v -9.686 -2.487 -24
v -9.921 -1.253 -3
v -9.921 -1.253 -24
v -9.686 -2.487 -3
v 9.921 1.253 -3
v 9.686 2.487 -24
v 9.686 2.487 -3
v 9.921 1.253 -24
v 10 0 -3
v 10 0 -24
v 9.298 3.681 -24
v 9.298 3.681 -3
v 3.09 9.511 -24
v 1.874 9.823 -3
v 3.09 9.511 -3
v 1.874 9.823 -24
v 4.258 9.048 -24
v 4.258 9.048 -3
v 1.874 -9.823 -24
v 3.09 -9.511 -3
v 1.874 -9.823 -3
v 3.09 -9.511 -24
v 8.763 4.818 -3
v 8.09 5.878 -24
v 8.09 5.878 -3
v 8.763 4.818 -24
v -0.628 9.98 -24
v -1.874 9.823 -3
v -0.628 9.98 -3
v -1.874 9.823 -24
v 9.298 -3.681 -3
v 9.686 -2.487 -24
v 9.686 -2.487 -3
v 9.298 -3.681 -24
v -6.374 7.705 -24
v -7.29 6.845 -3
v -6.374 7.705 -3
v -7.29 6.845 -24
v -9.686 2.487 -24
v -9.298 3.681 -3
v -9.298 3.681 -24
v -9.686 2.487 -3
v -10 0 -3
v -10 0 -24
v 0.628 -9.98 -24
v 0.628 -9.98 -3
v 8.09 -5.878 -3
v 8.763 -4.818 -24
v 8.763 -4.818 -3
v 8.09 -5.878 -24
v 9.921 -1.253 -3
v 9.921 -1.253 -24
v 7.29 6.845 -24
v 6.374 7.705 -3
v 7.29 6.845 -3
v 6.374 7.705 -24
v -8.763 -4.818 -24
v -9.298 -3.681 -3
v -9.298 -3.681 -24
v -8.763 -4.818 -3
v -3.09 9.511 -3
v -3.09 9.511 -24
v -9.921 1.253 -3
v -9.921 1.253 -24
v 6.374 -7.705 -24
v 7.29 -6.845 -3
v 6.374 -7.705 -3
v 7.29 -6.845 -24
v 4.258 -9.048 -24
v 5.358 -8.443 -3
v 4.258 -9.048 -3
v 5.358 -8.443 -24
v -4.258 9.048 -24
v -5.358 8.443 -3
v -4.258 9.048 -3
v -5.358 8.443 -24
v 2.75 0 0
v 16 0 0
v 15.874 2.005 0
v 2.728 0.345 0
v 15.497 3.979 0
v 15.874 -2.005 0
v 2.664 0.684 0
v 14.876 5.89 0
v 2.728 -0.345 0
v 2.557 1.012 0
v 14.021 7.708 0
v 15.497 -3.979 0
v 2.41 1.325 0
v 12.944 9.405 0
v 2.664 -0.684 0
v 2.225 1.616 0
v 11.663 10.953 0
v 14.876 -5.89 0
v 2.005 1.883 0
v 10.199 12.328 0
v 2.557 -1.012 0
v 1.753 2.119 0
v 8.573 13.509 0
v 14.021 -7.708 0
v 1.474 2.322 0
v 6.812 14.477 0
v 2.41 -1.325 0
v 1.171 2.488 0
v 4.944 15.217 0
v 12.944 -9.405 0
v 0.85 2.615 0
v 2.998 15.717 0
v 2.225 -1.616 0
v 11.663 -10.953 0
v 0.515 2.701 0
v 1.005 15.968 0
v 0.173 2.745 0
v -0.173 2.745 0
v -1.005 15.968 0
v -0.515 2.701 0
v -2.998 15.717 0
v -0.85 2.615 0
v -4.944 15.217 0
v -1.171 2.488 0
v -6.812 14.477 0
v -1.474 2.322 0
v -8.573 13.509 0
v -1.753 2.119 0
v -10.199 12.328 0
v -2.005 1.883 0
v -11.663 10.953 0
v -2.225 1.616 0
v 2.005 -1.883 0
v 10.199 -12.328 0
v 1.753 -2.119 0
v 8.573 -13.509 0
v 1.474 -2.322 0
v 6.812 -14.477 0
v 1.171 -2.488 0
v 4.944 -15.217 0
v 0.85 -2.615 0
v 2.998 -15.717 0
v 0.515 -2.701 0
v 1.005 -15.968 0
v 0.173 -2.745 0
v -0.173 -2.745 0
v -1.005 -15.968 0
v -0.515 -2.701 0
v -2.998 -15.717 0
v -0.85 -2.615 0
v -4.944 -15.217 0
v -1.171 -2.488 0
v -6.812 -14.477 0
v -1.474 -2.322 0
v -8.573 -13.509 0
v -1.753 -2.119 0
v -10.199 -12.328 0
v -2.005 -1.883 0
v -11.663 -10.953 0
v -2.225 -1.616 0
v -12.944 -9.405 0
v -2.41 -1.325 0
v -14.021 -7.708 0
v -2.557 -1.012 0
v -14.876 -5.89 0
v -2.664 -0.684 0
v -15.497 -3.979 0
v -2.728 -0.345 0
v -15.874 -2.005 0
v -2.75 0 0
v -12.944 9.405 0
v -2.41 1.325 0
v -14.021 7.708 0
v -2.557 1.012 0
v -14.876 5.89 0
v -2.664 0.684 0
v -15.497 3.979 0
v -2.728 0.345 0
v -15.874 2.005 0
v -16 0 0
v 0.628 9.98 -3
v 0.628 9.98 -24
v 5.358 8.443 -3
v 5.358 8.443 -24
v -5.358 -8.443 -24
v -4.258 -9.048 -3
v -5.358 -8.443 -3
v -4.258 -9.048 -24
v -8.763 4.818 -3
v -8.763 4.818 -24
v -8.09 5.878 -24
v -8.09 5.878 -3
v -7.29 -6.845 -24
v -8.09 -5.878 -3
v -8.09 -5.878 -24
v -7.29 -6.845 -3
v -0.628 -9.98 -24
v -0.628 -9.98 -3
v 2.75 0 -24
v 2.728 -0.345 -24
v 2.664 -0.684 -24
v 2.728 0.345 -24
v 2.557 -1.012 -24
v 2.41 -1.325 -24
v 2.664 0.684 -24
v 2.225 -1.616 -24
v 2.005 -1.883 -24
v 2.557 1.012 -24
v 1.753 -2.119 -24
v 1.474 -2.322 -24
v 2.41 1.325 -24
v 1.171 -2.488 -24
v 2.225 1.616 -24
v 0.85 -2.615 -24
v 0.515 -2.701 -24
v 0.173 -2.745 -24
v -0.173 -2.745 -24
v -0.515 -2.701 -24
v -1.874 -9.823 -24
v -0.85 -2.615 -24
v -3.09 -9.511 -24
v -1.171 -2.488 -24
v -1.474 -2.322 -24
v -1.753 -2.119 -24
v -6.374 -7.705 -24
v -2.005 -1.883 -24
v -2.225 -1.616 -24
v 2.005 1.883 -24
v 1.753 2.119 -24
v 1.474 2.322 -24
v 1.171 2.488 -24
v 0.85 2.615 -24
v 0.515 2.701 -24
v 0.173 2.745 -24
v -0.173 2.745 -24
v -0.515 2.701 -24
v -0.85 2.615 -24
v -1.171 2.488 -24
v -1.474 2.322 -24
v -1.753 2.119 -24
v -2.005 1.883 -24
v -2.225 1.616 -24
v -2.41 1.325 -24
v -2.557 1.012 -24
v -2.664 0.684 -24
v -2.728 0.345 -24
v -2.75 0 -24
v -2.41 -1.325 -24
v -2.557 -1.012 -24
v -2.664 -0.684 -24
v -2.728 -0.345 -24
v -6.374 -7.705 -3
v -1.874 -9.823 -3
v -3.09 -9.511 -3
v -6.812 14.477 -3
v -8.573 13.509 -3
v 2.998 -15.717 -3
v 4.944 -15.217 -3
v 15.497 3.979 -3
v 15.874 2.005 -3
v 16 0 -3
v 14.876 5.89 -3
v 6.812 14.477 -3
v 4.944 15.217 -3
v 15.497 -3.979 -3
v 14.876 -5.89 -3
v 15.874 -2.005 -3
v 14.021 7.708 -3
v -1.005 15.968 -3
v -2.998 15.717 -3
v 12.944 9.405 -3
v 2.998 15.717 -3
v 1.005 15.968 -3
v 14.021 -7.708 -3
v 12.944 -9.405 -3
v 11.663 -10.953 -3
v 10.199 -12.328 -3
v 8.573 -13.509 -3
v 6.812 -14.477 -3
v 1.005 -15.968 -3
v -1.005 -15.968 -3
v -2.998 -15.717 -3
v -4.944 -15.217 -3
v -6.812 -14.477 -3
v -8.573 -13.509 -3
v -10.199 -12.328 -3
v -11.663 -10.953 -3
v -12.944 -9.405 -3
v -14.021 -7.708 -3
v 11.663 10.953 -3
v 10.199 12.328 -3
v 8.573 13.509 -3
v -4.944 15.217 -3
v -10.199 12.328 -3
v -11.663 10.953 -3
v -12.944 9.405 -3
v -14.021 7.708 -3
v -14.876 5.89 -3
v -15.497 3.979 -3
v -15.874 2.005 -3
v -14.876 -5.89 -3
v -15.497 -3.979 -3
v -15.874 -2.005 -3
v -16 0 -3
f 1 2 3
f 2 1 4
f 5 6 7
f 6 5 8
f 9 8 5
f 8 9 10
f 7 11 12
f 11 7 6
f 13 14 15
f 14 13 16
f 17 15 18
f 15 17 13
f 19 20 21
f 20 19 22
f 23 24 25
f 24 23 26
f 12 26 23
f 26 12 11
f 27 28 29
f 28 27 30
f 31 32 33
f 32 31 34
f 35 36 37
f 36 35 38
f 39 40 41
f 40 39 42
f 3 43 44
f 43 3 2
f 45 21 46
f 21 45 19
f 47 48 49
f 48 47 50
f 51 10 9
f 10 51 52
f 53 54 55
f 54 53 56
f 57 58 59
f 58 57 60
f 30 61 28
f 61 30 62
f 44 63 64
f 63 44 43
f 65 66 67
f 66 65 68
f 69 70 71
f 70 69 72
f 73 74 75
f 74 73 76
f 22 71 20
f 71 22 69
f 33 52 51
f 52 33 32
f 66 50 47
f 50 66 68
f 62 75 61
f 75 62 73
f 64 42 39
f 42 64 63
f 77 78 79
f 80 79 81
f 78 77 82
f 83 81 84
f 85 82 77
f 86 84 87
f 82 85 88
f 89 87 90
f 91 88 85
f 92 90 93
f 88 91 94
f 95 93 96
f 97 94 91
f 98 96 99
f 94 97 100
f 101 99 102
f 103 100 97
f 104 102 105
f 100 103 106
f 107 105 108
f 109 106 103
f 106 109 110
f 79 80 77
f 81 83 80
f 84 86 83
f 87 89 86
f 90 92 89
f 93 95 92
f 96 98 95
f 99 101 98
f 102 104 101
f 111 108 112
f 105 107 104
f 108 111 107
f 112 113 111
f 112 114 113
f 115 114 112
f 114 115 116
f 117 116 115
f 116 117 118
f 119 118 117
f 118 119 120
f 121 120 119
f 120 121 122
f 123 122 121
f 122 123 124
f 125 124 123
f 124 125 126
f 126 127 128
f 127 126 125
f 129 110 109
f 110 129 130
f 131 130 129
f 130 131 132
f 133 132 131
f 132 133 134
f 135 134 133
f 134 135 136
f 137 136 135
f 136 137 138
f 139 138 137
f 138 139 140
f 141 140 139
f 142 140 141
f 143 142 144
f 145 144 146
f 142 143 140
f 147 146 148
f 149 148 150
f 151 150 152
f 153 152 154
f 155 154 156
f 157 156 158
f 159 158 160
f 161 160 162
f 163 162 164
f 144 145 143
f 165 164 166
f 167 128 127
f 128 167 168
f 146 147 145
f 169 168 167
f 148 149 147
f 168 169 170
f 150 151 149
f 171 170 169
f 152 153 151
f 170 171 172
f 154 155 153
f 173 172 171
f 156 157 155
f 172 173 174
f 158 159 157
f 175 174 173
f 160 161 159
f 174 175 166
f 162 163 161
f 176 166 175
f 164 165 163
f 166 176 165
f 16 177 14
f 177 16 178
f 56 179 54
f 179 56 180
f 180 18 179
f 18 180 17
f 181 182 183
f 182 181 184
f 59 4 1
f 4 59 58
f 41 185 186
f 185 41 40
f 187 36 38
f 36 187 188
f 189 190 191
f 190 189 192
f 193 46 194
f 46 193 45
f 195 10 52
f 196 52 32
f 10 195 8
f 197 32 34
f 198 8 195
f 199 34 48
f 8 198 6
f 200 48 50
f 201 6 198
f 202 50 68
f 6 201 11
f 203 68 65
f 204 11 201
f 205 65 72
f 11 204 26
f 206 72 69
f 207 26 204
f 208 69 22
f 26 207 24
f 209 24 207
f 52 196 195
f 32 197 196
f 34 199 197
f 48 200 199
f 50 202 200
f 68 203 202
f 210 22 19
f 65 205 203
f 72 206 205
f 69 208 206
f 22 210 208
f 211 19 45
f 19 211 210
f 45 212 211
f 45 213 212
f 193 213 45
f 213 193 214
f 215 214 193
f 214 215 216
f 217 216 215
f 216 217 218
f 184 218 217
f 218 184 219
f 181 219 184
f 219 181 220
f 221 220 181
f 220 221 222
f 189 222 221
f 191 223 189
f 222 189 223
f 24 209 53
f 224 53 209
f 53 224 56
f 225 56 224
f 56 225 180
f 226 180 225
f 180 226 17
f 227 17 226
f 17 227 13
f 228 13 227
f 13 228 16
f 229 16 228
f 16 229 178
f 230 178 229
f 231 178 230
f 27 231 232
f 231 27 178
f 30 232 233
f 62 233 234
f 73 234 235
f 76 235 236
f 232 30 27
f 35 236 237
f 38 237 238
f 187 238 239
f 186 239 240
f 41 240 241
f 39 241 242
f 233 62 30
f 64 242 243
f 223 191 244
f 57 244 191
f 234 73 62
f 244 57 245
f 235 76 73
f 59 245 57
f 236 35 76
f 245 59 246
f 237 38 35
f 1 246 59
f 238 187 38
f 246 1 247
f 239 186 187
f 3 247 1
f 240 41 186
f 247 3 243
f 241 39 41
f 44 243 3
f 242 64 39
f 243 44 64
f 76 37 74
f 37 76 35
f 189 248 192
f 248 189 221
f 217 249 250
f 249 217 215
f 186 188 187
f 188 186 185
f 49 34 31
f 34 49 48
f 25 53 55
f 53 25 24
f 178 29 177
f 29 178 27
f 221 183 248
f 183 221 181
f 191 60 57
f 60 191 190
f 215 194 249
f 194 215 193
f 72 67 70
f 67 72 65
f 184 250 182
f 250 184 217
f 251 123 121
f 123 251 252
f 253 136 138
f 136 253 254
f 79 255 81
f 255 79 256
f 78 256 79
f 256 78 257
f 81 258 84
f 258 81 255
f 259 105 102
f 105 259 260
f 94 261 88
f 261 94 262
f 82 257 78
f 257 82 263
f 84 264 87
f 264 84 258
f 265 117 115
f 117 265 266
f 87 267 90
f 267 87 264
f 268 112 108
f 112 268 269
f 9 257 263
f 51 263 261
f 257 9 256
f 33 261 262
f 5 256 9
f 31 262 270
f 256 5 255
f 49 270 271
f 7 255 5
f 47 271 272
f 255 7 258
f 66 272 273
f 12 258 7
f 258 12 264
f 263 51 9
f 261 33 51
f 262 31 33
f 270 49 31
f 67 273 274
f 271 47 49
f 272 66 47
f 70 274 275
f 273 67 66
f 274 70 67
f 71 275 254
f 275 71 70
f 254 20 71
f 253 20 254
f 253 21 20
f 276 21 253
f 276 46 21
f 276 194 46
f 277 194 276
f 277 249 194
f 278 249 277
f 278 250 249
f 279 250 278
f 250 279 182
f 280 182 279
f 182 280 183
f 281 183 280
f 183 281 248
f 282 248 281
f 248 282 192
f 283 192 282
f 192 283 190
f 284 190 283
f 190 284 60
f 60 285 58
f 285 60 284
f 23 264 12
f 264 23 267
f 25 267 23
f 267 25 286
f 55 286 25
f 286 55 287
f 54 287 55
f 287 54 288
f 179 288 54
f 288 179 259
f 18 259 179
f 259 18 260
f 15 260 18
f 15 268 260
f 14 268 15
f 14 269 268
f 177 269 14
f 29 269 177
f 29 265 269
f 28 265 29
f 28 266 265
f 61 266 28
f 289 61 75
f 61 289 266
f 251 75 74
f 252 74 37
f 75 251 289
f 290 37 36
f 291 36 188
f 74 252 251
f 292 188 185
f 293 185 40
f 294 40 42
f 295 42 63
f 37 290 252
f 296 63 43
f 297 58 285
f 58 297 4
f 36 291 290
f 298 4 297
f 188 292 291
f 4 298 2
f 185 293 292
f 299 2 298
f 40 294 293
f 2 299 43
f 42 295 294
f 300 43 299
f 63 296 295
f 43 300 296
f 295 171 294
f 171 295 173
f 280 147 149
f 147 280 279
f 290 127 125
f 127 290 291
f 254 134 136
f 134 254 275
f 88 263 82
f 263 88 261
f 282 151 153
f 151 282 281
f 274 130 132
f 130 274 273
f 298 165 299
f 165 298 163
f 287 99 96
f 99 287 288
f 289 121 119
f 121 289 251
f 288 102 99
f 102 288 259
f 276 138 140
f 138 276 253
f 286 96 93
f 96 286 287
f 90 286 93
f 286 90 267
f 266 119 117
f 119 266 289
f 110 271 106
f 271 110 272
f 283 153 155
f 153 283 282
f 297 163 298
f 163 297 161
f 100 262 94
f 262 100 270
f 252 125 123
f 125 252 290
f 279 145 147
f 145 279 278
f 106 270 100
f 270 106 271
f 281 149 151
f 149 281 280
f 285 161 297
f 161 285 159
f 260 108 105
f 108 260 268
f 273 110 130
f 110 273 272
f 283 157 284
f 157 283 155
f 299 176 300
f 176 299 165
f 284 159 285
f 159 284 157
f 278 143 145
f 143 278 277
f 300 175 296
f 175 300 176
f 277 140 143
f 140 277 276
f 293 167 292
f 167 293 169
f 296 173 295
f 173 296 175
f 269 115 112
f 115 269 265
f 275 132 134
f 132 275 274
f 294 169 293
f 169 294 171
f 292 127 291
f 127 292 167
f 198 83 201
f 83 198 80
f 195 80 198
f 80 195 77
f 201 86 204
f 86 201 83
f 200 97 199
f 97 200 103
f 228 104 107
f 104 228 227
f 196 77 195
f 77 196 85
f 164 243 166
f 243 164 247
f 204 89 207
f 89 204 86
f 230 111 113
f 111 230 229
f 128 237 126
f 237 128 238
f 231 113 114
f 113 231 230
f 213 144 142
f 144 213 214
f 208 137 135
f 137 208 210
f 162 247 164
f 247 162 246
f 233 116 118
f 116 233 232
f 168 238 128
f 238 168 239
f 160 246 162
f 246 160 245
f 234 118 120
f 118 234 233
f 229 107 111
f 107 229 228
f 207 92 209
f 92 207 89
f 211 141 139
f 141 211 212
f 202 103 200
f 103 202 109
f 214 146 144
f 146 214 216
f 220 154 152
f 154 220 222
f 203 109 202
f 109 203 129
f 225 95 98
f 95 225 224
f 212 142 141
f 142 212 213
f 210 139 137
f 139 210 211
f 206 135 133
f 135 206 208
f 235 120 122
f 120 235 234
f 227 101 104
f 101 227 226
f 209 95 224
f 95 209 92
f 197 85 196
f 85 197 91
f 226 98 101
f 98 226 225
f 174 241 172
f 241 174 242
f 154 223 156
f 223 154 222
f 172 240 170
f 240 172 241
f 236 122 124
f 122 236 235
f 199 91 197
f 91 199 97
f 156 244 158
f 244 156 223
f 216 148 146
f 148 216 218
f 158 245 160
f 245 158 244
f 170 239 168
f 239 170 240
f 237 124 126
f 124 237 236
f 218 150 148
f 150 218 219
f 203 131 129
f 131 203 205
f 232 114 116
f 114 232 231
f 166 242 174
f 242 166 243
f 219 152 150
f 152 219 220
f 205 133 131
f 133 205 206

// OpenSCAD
$fn = 50;


difference() {
	union() {
		translate(v = [0, 0, -24.0000000000]) {
			cylinder(h = 24, r = 10.0000000000);
		}
		translate(v = [0, 0, -3.0000000000]) {
			cylinder(h = 3, r = 16.0000000000);
		}
	}
	union() {
		#translate(v = [0, 0, -24]) {
			cylinder(h = 24, r = 2.7500000000);
		}
	}
}
